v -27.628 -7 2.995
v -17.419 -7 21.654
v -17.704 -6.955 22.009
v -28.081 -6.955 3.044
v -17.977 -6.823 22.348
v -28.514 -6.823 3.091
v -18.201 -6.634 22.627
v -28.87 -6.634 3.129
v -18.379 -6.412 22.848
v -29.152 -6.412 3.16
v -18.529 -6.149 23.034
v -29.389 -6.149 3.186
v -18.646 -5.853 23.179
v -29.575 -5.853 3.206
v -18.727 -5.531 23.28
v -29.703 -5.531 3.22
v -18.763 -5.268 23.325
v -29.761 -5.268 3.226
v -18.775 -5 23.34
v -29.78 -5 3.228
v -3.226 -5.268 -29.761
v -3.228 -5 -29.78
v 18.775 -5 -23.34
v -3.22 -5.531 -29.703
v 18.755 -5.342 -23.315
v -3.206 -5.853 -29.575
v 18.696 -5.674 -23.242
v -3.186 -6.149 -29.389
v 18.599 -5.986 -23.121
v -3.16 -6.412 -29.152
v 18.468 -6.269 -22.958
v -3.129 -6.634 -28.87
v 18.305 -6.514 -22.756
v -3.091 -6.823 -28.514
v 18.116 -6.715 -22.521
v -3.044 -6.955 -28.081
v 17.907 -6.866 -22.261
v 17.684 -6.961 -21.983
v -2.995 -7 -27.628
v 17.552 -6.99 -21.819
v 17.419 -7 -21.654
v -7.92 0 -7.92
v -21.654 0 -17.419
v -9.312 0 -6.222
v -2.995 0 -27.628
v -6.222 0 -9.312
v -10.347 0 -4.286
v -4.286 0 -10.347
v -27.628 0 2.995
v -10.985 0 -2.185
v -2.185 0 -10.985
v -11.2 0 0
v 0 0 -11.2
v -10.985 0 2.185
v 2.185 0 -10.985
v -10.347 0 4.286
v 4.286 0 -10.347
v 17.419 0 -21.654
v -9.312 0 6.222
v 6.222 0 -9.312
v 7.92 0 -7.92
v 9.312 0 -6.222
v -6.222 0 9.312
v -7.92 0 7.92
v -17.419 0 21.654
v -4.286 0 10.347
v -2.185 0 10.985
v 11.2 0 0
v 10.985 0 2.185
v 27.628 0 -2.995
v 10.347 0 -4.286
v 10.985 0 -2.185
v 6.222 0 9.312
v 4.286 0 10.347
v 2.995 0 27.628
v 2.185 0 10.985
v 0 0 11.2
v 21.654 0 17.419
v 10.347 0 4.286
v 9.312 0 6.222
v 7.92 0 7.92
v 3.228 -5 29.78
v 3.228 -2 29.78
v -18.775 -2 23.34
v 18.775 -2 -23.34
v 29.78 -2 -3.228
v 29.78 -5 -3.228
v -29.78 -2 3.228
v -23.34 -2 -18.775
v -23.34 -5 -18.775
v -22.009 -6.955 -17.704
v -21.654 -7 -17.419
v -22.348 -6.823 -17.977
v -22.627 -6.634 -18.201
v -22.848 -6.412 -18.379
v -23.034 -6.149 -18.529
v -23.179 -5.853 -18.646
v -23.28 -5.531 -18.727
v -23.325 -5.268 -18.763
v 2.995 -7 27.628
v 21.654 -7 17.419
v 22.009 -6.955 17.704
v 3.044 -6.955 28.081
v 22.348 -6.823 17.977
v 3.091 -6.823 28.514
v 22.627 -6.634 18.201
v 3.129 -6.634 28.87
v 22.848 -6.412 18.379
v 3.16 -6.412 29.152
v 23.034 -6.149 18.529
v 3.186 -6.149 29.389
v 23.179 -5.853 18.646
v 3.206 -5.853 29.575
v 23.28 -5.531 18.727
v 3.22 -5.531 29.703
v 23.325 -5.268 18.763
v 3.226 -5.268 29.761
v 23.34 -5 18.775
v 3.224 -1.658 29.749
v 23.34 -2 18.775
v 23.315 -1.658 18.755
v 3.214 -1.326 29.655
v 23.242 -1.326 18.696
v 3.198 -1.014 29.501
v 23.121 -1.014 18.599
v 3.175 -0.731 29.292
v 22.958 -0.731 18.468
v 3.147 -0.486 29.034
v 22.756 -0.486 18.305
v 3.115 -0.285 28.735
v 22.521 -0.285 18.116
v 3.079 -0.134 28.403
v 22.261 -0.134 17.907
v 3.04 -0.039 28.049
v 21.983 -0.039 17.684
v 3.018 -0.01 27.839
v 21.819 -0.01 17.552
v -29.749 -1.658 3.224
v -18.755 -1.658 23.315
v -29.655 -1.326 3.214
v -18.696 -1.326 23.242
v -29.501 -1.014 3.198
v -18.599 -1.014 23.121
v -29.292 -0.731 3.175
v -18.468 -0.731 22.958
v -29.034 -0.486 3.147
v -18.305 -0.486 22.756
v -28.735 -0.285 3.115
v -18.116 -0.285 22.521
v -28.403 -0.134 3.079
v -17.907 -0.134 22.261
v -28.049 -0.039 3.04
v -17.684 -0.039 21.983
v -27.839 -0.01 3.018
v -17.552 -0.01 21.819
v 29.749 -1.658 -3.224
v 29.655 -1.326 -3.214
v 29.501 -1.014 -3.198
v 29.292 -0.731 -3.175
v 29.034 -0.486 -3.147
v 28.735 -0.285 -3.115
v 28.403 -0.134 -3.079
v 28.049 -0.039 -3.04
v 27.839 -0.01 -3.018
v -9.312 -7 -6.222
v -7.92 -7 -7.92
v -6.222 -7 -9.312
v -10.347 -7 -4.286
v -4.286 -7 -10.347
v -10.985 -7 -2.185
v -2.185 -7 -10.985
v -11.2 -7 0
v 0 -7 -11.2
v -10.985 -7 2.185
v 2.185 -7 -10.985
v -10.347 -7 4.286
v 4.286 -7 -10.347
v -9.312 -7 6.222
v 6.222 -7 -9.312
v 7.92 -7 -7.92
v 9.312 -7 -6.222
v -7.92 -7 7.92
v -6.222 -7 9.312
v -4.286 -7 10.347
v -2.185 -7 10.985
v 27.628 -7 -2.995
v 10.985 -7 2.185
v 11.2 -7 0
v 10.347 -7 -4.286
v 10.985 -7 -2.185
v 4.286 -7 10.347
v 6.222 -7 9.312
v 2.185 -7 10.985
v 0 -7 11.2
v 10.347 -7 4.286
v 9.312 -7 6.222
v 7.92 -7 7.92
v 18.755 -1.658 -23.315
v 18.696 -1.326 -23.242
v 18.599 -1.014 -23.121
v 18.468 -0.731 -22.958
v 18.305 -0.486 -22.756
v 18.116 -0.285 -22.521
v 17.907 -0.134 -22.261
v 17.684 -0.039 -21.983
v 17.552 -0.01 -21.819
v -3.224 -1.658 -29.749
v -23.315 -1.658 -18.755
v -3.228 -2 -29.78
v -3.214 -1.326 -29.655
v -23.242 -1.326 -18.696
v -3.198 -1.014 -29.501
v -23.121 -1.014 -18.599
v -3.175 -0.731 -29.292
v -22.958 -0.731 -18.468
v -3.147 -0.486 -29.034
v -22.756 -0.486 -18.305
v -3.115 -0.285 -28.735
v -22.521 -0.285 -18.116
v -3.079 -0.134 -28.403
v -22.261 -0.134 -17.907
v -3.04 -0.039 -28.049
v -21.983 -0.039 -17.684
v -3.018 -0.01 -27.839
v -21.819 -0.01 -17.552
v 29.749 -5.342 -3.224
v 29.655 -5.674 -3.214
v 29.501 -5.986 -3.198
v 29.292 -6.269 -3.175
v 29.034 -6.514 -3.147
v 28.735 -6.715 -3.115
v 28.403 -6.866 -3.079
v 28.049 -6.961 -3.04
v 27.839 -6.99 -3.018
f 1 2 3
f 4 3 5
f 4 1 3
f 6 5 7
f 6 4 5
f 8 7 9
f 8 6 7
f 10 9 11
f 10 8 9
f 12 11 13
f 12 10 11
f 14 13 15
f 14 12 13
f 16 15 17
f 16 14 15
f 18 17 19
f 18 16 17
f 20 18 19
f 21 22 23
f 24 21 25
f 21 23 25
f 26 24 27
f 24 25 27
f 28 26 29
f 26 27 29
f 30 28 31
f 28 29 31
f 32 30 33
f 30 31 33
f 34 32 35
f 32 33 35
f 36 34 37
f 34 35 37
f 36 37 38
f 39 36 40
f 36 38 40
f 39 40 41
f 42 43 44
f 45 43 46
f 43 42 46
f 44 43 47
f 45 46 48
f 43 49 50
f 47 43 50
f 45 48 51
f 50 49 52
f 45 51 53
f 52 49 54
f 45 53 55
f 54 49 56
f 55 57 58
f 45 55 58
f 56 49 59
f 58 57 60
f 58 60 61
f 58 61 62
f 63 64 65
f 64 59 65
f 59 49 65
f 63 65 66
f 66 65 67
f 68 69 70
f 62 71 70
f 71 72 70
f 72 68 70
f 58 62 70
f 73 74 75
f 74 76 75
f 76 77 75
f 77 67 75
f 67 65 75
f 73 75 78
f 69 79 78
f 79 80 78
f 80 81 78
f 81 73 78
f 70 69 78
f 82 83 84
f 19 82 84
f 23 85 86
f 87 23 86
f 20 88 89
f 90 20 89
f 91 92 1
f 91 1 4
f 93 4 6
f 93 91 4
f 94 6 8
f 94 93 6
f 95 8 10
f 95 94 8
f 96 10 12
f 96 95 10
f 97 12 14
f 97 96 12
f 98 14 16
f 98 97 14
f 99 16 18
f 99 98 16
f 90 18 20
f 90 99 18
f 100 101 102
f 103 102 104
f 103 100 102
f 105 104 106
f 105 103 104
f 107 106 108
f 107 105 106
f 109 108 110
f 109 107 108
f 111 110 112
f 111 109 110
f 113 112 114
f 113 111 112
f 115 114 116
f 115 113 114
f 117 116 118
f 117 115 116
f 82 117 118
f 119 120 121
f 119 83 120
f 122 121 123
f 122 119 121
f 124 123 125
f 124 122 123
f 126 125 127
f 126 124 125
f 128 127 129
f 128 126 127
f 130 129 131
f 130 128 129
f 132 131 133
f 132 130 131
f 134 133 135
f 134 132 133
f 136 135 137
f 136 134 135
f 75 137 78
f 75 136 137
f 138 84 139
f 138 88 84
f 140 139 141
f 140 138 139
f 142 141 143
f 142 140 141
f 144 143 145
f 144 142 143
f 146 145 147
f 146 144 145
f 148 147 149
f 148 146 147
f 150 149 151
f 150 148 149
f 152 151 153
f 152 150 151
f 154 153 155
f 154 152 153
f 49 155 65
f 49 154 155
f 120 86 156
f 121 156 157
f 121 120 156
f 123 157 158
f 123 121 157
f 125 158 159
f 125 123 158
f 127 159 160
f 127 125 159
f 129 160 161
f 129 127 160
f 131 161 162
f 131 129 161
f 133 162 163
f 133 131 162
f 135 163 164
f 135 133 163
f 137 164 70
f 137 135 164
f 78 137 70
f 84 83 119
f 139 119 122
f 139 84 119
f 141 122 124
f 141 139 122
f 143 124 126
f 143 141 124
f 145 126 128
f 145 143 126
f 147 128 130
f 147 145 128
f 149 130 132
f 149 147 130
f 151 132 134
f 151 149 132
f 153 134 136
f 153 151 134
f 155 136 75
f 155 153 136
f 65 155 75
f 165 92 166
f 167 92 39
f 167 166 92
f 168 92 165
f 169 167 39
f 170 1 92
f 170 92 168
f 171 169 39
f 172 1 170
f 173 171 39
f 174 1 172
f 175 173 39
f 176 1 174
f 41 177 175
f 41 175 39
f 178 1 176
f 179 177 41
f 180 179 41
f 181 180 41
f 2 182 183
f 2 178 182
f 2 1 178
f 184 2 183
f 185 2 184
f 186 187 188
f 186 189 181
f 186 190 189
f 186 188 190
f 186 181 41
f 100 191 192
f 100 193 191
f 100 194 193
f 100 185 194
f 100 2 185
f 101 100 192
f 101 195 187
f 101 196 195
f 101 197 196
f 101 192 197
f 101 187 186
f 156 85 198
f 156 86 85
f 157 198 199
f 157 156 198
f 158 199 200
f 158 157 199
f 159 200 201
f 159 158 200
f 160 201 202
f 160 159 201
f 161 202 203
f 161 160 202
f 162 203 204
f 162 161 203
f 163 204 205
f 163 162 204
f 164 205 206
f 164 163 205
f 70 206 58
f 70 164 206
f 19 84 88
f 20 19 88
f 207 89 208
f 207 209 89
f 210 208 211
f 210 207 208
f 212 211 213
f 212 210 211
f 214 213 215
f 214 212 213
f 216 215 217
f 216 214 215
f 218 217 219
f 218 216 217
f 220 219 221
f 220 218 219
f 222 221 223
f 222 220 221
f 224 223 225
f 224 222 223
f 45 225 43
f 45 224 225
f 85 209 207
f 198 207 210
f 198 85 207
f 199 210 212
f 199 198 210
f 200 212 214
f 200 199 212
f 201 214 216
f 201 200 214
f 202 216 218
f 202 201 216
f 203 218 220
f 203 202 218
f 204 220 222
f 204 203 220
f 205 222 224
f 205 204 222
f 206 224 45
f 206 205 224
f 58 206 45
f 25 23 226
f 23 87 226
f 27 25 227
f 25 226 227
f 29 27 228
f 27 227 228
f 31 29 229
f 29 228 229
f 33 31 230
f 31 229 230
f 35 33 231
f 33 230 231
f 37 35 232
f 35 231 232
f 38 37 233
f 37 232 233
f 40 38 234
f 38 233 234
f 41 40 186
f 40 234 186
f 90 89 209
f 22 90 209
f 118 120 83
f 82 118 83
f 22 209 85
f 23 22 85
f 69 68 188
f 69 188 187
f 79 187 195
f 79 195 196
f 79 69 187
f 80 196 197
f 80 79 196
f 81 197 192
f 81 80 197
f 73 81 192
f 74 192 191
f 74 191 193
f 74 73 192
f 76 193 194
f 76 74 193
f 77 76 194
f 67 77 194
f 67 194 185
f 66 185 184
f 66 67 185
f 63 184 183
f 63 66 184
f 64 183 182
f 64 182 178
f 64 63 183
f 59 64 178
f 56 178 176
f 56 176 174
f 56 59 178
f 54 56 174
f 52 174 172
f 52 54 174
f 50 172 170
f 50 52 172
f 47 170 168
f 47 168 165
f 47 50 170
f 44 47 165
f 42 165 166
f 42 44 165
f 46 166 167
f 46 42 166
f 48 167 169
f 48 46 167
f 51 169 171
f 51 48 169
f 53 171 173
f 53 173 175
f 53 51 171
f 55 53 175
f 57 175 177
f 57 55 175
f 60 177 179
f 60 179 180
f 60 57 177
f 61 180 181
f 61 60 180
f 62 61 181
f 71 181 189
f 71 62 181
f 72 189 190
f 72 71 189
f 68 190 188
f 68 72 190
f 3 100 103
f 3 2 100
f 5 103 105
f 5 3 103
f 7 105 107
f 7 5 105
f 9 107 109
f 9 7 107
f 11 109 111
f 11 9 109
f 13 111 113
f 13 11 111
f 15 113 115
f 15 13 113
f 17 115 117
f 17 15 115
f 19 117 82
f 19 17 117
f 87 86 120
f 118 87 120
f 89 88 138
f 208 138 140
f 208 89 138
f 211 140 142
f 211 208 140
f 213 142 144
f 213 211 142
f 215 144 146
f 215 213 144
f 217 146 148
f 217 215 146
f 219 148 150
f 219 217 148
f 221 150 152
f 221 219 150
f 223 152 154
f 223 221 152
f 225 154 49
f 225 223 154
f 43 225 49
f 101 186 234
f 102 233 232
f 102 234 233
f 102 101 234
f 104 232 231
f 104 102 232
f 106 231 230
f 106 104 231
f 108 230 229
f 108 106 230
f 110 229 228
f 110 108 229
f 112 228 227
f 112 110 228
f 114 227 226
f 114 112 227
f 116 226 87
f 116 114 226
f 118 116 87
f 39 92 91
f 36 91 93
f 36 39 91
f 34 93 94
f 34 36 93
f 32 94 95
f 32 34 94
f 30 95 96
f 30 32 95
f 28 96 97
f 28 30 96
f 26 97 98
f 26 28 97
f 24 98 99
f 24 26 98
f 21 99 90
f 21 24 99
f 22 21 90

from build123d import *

# Parameters (mm, degrees)
F0_R     = 13.2
F0_R_2   = 11.2
F1_DEPTH = 7
F2_R     = 2
F3_R     = 2


with BuildPart() as f1:
    # F0 (on Front) → F1 (new body)
    with BuildSketch(Plane.XZ):
        Polygon((18.775388, -23.340316), (29.7803, -3.227892), (23.340316, 18.775388), (3.227892, 29.7803), (-18.775388, 23.340316), (-29.7803, 3.227892), (-23.340316, -18.775388), (-3.227892, -29.7803), align=None)
        Circle(F0_R, mode=Mode.SUBTRACT)
        Circle(F0_R)
        Circle(F0_R_2, mode=Mode.SUBTRACT)
    extrude(amount=F1_DEPTH)

    # F2
    f2_edges = [f1.edges().sort_by_distance(p)[0] for p in [
        (13.284104, 0, 24.277844),
        (26.560308, 0, 7.773748),
        (24.277844, 0, -13.284104),
        (7.773748, 0, -26.560308),
        (-13.284104, 0, -24.277844),
        (-26.560308, 0, -7.773748),
        (-24.277844, 0, 13.284104),
        (-7.773748, 0, 26.560308),
    ]]
    fillet(f2_edges, radius=F2_R)

    # F3
    f3_edges = [f1.edges().sort_by_distance(p)[0] for p in [
        (-7.773748, -7, 26.560308),
        (-24.277844, -7, 13.284104),
        (-26.560308, -7, -7.773748),
        (-13.284104, -7, -24.277844),
        (7.773748, -7, -26.560308),
        (24.277844, -7, -13.284104),
        (26.560308, -7, 7.773748),
        (13.284104, -7, 24.277844),
    ]]
    fillet(f3_edges, radius=F3_R)


solid = f1.part
